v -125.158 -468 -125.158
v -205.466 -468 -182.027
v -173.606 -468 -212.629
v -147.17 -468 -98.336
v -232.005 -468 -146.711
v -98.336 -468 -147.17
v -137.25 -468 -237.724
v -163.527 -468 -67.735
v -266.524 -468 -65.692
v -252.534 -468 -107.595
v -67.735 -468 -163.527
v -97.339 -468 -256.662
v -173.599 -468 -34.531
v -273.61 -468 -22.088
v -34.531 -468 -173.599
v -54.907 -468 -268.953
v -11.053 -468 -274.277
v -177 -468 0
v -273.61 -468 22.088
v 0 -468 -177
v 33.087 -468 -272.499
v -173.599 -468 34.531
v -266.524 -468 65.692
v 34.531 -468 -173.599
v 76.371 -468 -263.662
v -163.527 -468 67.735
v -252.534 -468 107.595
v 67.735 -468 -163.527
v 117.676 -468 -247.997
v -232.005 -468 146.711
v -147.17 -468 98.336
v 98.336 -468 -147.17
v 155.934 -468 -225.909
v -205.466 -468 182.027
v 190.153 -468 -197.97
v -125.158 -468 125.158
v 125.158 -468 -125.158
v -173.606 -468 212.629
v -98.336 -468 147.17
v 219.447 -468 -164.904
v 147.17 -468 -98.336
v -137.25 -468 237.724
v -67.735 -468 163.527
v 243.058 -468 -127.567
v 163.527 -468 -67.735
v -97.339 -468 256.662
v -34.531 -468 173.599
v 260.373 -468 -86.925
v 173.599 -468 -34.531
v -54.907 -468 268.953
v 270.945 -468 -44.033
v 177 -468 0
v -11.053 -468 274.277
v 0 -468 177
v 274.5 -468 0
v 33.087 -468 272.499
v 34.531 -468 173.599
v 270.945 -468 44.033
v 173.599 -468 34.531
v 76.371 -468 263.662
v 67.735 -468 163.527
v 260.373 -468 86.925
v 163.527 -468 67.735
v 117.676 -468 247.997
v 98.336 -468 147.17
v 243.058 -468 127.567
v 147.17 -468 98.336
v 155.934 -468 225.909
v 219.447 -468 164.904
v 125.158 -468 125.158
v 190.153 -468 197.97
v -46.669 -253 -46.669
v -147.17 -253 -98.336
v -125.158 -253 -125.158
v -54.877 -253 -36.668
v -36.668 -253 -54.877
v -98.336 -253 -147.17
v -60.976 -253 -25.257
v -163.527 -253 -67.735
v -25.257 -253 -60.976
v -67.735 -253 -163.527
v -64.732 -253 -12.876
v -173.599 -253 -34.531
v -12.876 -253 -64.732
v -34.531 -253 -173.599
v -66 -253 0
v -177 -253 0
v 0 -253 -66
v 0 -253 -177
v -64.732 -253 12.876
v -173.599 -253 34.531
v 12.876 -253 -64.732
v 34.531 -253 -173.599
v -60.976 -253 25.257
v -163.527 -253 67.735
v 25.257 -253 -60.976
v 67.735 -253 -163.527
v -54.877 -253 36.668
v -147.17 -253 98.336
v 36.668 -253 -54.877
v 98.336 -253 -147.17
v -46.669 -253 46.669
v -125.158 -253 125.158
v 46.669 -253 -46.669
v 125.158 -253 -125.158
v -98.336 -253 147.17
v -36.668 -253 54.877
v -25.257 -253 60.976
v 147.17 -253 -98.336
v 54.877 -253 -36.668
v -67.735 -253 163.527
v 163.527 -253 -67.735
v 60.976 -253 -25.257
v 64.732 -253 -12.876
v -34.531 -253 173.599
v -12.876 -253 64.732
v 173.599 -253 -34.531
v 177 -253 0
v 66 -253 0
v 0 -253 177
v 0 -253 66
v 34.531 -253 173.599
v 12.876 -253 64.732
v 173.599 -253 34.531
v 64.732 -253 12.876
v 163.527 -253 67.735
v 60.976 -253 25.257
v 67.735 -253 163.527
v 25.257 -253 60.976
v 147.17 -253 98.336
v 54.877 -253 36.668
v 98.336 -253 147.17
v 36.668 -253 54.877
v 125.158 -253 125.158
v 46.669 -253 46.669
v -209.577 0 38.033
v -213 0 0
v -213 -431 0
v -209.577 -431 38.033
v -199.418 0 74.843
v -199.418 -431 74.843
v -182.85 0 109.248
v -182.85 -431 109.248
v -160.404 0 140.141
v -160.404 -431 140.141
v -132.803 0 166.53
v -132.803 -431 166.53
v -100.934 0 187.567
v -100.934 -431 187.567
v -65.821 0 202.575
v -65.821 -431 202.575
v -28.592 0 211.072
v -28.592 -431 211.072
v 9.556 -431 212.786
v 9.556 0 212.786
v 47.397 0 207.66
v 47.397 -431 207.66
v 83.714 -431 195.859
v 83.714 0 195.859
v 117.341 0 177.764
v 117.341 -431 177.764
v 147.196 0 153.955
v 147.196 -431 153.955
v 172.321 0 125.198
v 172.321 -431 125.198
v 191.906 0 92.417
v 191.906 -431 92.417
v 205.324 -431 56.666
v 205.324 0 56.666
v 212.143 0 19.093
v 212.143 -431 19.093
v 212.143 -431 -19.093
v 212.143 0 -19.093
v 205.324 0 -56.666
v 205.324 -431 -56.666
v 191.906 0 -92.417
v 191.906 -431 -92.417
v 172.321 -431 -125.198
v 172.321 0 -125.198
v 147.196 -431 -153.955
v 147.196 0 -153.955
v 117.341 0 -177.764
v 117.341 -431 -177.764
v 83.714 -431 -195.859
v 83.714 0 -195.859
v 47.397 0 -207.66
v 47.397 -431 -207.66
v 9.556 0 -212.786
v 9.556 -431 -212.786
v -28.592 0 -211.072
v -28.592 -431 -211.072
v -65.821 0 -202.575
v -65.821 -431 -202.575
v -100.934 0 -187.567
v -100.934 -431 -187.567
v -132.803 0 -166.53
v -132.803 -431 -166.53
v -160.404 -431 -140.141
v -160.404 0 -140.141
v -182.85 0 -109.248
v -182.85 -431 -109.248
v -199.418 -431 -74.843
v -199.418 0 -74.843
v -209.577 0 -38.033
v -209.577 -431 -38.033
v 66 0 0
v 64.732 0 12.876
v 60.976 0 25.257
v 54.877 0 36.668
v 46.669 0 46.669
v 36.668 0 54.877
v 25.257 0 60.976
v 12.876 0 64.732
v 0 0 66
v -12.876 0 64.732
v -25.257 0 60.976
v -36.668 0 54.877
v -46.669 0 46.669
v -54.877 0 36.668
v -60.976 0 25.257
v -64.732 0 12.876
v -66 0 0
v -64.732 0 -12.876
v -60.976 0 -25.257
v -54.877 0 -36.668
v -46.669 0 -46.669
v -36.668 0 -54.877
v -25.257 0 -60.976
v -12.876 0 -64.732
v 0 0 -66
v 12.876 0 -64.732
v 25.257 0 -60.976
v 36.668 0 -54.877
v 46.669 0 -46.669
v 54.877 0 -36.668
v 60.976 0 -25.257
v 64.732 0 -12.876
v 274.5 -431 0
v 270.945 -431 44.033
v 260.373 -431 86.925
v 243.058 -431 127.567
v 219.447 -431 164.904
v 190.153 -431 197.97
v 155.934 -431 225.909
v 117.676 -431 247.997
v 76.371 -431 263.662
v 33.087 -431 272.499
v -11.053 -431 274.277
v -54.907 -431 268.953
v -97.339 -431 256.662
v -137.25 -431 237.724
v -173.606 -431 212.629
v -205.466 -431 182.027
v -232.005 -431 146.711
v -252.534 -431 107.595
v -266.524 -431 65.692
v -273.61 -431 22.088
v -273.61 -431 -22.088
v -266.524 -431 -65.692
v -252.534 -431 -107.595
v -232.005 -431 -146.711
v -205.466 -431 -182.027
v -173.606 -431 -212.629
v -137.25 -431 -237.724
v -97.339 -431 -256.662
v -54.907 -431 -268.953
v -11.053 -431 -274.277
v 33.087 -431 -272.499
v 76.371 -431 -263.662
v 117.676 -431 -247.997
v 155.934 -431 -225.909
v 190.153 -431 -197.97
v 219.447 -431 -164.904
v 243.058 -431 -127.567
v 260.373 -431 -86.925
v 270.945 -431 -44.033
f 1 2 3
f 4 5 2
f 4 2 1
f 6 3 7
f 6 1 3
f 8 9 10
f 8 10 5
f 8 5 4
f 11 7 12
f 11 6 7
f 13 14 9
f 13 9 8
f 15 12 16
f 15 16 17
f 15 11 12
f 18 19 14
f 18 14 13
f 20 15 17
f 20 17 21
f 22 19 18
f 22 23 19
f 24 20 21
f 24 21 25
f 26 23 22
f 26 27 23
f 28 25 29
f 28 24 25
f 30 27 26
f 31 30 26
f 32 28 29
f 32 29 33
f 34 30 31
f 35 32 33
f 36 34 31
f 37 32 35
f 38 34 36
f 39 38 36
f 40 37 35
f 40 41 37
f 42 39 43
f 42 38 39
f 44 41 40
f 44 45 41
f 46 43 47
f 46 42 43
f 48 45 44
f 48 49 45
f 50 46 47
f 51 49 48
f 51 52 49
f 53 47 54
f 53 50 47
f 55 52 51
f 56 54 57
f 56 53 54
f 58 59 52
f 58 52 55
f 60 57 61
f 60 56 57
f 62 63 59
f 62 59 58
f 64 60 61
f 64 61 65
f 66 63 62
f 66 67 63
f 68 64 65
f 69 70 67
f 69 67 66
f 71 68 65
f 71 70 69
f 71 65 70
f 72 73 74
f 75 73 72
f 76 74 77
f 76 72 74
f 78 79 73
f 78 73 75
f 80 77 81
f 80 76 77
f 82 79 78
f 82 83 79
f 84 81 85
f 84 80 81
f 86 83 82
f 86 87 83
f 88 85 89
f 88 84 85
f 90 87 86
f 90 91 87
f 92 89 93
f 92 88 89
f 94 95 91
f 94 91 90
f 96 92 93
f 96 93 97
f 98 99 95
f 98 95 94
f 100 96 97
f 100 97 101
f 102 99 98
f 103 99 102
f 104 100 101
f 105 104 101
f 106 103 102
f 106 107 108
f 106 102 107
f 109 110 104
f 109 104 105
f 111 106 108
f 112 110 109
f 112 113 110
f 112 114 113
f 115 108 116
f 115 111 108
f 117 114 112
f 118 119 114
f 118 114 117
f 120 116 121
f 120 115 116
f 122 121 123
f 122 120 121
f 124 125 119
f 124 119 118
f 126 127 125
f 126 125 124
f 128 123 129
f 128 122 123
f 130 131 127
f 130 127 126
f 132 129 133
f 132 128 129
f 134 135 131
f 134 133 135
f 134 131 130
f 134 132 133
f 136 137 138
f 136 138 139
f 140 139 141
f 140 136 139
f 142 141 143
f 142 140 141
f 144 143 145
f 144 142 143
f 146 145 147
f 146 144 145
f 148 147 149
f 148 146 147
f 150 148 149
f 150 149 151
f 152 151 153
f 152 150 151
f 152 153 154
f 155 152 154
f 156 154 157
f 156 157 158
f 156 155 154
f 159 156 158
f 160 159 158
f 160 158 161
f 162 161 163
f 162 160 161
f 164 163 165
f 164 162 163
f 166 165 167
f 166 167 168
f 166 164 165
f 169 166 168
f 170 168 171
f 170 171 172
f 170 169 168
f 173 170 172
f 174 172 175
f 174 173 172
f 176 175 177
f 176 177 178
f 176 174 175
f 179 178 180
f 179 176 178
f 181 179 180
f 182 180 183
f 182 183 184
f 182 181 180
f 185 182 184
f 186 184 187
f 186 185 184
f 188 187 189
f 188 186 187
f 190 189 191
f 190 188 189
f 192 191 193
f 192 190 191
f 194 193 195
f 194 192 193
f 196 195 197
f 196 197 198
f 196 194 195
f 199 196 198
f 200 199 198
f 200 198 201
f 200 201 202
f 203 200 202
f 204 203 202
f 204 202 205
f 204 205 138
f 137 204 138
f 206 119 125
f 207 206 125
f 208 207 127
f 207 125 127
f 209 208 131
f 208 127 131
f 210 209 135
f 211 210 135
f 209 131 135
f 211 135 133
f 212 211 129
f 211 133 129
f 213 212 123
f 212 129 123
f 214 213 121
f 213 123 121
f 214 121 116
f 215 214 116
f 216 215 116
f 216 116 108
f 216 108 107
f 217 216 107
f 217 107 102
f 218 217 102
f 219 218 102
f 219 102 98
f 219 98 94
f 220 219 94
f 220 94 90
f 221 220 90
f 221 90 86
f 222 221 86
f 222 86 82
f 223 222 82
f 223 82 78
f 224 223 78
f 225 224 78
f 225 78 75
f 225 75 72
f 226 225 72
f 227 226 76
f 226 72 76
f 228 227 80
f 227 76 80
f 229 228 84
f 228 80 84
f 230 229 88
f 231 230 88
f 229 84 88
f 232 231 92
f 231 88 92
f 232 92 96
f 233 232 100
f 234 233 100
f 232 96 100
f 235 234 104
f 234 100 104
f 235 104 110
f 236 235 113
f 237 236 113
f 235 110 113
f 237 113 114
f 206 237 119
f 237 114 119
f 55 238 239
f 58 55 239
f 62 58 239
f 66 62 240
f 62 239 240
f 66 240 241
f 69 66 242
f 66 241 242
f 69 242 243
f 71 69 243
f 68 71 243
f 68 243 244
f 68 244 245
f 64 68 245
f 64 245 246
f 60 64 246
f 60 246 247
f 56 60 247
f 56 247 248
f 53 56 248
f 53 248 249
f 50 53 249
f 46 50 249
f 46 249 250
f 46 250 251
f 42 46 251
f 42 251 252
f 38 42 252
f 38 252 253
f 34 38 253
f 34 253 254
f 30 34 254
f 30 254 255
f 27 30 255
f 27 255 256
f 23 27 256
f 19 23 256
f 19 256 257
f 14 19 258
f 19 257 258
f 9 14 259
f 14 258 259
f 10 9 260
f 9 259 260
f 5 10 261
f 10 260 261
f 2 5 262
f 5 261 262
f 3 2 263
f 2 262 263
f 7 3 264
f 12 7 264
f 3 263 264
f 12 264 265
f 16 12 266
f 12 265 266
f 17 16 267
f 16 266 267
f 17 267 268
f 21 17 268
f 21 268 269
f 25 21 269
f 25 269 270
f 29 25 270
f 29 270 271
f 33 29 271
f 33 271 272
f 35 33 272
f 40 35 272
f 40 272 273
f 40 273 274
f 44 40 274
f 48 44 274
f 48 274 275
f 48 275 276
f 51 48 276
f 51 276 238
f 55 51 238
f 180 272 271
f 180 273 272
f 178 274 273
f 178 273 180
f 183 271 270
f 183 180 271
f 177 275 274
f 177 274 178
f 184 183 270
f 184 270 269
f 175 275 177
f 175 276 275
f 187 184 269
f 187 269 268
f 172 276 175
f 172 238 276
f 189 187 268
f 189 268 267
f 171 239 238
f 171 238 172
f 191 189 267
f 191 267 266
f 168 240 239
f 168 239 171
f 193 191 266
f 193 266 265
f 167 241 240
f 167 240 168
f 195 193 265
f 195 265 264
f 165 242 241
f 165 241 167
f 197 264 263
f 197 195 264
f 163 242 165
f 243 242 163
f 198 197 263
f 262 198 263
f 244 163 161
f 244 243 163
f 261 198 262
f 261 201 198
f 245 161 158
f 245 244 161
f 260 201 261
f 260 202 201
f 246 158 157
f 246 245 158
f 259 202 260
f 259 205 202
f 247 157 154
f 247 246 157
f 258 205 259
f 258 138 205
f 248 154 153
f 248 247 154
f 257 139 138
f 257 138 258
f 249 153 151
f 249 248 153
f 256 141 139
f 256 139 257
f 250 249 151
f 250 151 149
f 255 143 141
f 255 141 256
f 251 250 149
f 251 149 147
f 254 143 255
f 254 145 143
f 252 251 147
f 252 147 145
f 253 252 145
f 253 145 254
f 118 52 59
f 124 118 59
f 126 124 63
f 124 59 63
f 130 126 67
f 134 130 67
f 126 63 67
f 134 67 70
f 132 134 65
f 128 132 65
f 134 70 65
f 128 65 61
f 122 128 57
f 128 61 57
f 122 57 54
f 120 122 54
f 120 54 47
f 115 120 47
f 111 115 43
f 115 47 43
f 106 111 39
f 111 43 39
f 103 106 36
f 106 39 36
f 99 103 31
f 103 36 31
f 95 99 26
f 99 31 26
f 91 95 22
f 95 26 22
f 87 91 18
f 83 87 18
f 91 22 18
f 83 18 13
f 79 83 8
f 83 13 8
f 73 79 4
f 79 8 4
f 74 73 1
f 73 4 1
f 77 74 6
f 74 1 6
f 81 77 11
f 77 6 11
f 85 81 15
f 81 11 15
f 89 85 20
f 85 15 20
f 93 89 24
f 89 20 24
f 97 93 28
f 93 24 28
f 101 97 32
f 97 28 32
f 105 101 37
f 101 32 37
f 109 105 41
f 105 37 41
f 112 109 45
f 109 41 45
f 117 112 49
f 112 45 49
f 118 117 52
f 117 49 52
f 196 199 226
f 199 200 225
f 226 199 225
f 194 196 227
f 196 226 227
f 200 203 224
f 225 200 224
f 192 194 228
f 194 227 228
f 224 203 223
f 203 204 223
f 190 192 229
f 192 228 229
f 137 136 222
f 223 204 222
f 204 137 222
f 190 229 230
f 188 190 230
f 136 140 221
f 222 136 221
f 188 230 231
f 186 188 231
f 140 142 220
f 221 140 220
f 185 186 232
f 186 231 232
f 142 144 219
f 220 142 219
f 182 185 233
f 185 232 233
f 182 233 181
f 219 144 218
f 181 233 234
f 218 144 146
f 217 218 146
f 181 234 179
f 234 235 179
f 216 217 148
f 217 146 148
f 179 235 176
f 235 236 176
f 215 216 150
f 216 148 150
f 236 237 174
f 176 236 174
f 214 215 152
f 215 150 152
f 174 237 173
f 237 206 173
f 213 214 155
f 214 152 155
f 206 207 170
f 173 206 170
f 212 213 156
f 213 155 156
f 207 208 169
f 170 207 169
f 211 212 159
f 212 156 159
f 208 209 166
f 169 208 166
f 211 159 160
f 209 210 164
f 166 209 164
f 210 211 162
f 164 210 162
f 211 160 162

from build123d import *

# Parameters (mm, degrees)
F0_R     = 274.5
F1_DEPTH = 468
F2_R     = 66
F3_DEPTH = 468
F4_R     = 177
F4_R_2   = 66
F5_DEPTH = 215
F6_R     = 274.5
F6_R_2   = 213
F7_DEPTH = 431


with BuildPart() as f1:
    # F0 (on Front) → F1 (new body)
    with BuildSketch(Plane.XZ):
        Circle(F0_R)
    extrude(amount=F1_DEPTH)

    # F2 (on face) → F3 (cut)
    with BuildSketch(Plane.XZ.offset(468)):
        Circle(F2_R)
    extrude(amount=-F3_DEPTH, mode=Mode.SUBTRACT)

    # F4 (on face) → F5 (cut)
    with BuildSketch(Plane.XZ.offset(468)):
        Circle(F4_R)
        Circle(F4_R_2, mode=Mode.SUBTRACT)
    extrude(amount=-F5_DEPTH, mode=Mode.SUBTRACT)

    # F6 (on face) → F7 (cut)
    with BuildSketch(Plane(origin=(0, 0, 0), x_dir=(-1, 0, 0), z_dir=(0, 1, 0))):
        Circle(F6_R)
        Circle(F6_R_2, mode=Mode.SUBTRACT)
    extrude(amount=-F7_DEPTH, mode=Mode.SUBTRACT)


solid = f1.part
